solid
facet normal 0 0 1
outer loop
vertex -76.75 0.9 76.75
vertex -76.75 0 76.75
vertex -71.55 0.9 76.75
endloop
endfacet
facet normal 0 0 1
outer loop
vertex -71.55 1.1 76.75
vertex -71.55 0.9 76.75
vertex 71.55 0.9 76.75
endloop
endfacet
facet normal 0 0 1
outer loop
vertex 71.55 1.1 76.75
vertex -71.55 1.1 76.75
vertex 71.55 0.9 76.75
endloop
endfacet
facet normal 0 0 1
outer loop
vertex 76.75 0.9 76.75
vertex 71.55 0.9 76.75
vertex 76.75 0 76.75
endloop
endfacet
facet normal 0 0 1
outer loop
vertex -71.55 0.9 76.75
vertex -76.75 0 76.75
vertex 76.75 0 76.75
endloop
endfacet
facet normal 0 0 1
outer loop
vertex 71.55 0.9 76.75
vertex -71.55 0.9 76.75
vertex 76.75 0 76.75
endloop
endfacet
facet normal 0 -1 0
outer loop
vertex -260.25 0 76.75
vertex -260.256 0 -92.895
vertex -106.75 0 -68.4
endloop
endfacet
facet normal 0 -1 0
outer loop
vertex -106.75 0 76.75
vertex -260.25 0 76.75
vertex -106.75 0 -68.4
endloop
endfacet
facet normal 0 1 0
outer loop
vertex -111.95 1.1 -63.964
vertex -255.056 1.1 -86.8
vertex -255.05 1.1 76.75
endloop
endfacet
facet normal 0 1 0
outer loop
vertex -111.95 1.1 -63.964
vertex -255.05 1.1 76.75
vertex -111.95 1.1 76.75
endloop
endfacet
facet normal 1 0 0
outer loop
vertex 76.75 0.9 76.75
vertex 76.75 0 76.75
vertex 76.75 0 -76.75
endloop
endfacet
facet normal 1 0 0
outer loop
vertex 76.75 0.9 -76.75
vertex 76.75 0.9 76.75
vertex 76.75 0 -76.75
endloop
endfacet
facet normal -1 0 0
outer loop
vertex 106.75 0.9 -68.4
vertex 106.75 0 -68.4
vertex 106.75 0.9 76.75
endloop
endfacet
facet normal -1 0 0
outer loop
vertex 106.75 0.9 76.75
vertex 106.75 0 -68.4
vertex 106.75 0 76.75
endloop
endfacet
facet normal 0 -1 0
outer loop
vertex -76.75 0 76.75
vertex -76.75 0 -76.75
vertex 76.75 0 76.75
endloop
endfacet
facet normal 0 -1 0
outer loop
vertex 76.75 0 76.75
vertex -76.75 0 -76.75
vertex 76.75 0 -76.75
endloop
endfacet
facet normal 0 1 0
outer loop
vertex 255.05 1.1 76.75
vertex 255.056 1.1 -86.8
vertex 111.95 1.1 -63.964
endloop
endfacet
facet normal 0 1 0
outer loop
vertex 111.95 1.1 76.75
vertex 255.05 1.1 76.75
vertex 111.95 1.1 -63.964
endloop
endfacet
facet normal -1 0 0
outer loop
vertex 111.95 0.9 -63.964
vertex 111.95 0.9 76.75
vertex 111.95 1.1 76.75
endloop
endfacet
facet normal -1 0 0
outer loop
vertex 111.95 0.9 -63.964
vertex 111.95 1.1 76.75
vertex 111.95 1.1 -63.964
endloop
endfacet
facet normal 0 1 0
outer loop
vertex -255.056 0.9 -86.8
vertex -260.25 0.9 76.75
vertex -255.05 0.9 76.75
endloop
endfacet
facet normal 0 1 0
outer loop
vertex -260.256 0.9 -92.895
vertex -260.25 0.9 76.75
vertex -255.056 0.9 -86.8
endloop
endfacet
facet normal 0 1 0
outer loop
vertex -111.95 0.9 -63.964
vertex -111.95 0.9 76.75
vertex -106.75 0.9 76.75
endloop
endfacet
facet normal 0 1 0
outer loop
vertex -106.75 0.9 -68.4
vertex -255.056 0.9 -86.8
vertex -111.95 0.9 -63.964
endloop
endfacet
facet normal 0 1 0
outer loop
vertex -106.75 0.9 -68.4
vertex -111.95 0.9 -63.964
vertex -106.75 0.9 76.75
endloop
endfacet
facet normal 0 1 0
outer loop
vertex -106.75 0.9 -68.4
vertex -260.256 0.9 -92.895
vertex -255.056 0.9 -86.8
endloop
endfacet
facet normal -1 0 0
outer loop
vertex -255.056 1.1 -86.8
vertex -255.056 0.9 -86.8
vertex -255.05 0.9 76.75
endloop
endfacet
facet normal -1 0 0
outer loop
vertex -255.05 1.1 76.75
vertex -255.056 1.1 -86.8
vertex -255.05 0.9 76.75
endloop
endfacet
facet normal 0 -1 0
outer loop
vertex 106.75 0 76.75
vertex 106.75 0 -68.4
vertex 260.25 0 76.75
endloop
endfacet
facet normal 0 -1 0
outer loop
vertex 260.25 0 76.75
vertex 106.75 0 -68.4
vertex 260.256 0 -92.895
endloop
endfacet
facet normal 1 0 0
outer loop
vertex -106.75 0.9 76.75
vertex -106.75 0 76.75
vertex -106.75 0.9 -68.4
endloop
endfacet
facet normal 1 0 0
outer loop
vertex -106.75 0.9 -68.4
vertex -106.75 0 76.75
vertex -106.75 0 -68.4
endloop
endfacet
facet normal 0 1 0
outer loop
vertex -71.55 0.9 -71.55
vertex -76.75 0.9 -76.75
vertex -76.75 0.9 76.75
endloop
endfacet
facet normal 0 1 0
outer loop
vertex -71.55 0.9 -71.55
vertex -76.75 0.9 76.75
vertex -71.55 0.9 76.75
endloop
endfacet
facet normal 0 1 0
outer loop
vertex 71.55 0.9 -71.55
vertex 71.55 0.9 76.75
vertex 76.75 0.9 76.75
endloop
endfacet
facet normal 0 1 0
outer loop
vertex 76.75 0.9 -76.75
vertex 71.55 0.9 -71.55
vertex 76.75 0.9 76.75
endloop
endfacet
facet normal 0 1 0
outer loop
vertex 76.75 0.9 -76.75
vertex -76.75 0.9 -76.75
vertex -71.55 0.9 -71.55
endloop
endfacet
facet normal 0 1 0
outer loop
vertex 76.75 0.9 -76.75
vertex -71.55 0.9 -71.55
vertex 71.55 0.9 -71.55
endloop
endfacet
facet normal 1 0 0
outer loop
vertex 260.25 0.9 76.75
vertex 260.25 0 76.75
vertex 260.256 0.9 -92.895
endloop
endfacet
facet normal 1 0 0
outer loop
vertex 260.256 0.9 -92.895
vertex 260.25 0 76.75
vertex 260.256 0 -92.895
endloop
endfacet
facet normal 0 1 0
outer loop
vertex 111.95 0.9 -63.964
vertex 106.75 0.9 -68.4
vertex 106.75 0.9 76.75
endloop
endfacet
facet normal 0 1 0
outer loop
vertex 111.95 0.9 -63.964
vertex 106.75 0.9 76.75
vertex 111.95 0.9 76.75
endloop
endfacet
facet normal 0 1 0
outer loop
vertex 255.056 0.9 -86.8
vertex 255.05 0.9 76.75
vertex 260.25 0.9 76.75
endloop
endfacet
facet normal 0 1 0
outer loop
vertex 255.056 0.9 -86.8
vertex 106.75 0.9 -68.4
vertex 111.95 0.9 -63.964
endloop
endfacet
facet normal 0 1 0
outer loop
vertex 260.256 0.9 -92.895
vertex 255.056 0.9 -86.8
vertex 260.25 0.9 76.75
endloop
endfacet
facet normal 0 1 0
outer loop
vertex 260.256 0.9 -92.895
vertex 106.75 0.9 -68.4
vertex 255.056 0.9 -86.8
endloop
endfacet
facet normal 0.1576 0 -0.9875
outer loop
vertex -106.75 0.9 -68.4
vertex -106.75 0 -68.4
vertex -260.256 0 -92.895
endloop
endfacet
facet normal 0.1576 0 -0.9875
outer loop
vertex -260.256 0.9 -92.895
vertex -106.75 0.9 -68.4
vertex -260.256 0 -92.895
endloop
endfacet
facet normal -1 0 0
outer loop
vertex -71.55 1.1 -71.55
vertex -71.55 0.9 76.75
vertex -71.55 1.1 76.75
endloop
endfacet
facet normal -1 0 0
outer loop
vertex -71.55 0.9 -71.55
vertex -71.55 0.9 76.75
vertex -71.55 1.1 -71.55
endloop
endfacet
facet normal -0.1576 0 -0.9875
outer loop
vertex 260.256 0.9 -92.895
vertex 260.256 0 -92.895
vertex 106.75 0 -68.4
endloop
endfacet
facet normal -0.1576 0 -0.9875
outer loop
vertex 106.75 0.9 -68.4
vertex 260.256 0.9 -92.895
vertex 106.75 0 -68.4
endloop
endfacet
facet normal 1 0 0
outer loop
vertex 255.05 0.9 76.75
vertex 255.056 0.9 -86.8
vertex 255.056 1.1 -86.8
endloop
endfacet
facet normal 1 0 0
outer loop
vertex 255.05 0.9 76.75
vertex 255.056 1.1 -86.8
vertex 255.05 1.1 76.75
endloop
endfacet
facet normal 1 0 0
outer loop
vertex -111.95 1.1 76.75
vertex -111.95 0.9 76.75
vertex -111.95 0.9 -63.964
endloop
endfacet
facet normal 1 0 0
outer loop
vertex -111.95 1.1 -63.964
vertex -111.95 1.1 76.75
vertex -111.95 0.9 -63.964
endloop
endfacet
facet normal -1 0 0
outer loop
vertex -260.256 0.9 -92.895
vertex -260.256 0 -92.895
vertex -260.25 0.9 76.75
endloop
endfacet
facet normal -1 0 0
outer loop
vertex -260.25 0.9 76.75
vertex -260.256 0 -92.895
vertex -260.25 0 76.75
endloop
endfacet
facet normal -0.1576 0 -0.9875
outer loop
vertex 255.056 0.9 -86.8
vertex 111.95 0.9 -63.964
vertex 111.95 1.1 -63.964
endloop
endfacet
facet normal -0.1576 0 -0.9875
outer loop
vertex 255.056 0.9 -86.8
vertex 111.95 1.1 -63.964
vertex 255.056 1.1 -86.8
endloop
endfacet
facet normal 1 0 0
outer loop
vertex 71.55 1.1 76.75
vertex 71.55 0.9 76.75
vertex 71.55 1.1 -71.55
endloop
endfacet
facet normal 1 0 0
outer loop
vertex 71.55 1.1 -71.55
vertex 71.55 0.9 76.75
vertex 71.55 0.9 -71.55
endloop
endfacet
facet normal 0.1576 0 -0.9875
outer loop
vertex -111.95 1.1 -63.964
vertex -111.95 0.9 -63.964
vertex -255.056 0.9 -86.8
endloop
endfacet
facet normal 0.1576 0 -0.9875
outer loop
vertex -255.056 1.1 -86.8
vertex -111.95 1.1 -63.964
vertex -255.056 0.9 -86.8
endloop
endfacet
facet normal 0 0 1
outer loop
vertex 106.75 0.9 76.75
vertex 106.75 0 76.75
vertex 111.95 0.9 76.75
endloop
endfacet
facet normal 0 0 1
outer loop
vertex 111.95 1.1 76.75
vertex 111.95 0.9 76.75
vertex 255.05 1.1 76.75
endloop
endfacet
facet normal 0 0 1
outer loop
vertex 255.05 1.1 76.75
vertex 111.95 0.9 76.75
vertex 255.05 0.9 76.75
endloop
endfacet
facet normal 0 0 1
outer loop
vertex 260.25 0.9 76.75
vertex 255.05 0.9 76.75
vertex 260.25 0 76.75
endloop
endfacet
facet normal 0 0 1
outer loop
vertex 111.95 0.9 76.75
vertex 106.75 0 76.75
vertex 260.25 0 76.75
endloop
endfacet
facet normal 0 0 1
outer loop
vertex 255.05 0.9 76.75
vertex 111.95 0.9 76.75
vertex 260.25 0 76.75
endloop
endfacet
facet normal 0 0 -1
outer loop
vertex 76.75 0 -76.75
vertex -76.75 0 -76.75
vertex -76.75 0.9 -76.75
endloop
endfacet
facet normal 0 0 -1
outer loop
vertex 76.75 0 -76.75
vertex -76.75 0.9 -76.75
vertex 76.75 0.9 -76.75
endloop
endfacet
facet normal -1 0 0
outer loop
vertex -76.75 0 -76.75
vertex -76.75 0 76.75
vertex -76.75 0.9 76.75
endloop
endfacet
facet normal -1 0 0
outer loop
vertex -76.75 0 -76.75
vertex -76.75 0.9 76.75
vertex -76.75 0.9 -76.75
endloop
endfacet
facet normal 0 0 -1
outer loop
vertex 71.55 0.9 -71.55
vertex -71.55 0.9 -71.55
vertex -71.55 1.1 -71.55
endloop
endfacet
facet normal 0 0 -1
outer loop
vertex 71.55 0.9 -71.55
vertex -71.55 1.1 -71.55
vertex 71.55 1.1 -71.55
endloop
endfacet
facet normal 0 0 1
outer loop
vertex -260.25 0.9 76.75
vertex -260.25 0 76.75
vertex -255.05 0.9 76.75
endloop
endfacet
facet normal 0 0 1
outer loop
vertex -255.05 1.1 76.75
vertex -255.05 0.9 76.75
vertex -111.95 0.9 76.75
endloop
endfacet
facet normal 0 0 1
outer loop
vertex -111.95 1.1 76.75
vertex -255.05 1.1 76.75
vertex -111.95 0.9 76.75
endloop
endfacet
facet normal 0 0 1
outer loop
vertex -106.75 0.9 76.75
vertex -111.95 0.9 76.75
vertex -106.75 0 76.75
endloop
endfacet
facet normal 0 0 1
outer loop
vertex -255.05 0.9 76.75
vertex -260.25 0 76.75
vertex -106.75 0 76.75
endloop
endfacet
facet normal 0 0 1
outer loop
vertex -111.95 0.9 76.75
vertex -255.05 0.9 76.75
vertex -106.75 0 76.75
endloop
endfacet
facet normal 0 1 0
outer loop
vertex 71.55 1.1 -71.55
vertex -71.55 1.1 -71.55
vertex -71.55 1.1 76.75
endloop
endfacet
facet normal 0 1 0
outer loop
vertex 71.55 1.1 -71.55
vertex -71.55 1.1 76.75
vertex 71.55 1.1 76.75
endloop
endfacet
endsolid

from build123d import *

# Parameters (mm, degrees)
SKETCH1_W             = 153.5
SKETCH1_H             = 153.5
BOSS_EXTRUDE1_DEPTH   = 0.9
BOSS_EXTRUDE1_2_DEPTH = 0.9
BOSS_EXTRUDE1_3_DEPTH = 0.9
SKETCH2_W             = 143.1
SKETCH2_H             = 148.3
BOSS_EXTRUDE2_DEPTH   = 0.2


with BuildPart() as part:
    # Sketch1 → Boss-Extrude1 (new body)
    with BuildSketch(Plane(origin=(0, 0, 0), x_dir=(1, 0, 0), z_dir=(0, 1, 0))):
        Rectangle(SKETCH1_W, SKETCH1_H)
    extrude(amount=BOSS_EXTRUDE1_DEPTH)



with BuildPart() as body_2:
    # Sketch1 → Boss-Extrude1 2 (new body)
    with BuildSketch(Plane(origin=(0, 0, 0), x_dir=(1, 0, 0), z_dir=(0, 1, 0))):
        Polygon((-260.256246951, 92.895183815), (-260.25, -76.75), (-106.75, -76.75), (-106.75, 68.39950611), align=None)
    extrude(amount=BOSS_EXTRUDE1_2_DEPTH)


with BuildPart() as body_3:
    # Sketch1 → Boss-Extrude1 3 (new body)
    with BuildSketch(Plane(origin=(0, 0, 0), x_dir=(1, 0, 0), z_dir=(0, 1, 0))):
        Polygon((260.256246951, 92.895183815), (106.75, 68.39950611), (106.75, -76.75), (260.25, -76.75), align=None)
    extrude(amount=BOSS_EXTRUDE1_3_DEPTH)


with BuildPart() as part_1:
    add(part.part)

    add(body_2.part)  # Boss-Extrude2 merges body 2

    add(body_3.part)  # Boss-Extrude2 merges body 3
    # Sketch2 → Boss-Extrude2 (add)
    with BuildSketch(Plane(origin=(0, 0.9, 0), x_dir=(1, 0, 0), z_dir=(0, 1, 0))):
        with Locations((0, -2.6)):
            Rectangle(SKETCH2_W, SKETCH2_H)
        Polygon((-111.95, -76.75), (-111.95, 63.963503104), (-255.056022485, 86.799570522), (-255.049999996, -76.75), align=None)
        Polygon((111.95, -76.75), (111.95, 63.963503104), (255.056022485, 86.799570522), (255.049999996, -76.75), align=None)
    extrude(amount=BOSS_EXTRUDE2_DEPTH)


solid = part_1.part
